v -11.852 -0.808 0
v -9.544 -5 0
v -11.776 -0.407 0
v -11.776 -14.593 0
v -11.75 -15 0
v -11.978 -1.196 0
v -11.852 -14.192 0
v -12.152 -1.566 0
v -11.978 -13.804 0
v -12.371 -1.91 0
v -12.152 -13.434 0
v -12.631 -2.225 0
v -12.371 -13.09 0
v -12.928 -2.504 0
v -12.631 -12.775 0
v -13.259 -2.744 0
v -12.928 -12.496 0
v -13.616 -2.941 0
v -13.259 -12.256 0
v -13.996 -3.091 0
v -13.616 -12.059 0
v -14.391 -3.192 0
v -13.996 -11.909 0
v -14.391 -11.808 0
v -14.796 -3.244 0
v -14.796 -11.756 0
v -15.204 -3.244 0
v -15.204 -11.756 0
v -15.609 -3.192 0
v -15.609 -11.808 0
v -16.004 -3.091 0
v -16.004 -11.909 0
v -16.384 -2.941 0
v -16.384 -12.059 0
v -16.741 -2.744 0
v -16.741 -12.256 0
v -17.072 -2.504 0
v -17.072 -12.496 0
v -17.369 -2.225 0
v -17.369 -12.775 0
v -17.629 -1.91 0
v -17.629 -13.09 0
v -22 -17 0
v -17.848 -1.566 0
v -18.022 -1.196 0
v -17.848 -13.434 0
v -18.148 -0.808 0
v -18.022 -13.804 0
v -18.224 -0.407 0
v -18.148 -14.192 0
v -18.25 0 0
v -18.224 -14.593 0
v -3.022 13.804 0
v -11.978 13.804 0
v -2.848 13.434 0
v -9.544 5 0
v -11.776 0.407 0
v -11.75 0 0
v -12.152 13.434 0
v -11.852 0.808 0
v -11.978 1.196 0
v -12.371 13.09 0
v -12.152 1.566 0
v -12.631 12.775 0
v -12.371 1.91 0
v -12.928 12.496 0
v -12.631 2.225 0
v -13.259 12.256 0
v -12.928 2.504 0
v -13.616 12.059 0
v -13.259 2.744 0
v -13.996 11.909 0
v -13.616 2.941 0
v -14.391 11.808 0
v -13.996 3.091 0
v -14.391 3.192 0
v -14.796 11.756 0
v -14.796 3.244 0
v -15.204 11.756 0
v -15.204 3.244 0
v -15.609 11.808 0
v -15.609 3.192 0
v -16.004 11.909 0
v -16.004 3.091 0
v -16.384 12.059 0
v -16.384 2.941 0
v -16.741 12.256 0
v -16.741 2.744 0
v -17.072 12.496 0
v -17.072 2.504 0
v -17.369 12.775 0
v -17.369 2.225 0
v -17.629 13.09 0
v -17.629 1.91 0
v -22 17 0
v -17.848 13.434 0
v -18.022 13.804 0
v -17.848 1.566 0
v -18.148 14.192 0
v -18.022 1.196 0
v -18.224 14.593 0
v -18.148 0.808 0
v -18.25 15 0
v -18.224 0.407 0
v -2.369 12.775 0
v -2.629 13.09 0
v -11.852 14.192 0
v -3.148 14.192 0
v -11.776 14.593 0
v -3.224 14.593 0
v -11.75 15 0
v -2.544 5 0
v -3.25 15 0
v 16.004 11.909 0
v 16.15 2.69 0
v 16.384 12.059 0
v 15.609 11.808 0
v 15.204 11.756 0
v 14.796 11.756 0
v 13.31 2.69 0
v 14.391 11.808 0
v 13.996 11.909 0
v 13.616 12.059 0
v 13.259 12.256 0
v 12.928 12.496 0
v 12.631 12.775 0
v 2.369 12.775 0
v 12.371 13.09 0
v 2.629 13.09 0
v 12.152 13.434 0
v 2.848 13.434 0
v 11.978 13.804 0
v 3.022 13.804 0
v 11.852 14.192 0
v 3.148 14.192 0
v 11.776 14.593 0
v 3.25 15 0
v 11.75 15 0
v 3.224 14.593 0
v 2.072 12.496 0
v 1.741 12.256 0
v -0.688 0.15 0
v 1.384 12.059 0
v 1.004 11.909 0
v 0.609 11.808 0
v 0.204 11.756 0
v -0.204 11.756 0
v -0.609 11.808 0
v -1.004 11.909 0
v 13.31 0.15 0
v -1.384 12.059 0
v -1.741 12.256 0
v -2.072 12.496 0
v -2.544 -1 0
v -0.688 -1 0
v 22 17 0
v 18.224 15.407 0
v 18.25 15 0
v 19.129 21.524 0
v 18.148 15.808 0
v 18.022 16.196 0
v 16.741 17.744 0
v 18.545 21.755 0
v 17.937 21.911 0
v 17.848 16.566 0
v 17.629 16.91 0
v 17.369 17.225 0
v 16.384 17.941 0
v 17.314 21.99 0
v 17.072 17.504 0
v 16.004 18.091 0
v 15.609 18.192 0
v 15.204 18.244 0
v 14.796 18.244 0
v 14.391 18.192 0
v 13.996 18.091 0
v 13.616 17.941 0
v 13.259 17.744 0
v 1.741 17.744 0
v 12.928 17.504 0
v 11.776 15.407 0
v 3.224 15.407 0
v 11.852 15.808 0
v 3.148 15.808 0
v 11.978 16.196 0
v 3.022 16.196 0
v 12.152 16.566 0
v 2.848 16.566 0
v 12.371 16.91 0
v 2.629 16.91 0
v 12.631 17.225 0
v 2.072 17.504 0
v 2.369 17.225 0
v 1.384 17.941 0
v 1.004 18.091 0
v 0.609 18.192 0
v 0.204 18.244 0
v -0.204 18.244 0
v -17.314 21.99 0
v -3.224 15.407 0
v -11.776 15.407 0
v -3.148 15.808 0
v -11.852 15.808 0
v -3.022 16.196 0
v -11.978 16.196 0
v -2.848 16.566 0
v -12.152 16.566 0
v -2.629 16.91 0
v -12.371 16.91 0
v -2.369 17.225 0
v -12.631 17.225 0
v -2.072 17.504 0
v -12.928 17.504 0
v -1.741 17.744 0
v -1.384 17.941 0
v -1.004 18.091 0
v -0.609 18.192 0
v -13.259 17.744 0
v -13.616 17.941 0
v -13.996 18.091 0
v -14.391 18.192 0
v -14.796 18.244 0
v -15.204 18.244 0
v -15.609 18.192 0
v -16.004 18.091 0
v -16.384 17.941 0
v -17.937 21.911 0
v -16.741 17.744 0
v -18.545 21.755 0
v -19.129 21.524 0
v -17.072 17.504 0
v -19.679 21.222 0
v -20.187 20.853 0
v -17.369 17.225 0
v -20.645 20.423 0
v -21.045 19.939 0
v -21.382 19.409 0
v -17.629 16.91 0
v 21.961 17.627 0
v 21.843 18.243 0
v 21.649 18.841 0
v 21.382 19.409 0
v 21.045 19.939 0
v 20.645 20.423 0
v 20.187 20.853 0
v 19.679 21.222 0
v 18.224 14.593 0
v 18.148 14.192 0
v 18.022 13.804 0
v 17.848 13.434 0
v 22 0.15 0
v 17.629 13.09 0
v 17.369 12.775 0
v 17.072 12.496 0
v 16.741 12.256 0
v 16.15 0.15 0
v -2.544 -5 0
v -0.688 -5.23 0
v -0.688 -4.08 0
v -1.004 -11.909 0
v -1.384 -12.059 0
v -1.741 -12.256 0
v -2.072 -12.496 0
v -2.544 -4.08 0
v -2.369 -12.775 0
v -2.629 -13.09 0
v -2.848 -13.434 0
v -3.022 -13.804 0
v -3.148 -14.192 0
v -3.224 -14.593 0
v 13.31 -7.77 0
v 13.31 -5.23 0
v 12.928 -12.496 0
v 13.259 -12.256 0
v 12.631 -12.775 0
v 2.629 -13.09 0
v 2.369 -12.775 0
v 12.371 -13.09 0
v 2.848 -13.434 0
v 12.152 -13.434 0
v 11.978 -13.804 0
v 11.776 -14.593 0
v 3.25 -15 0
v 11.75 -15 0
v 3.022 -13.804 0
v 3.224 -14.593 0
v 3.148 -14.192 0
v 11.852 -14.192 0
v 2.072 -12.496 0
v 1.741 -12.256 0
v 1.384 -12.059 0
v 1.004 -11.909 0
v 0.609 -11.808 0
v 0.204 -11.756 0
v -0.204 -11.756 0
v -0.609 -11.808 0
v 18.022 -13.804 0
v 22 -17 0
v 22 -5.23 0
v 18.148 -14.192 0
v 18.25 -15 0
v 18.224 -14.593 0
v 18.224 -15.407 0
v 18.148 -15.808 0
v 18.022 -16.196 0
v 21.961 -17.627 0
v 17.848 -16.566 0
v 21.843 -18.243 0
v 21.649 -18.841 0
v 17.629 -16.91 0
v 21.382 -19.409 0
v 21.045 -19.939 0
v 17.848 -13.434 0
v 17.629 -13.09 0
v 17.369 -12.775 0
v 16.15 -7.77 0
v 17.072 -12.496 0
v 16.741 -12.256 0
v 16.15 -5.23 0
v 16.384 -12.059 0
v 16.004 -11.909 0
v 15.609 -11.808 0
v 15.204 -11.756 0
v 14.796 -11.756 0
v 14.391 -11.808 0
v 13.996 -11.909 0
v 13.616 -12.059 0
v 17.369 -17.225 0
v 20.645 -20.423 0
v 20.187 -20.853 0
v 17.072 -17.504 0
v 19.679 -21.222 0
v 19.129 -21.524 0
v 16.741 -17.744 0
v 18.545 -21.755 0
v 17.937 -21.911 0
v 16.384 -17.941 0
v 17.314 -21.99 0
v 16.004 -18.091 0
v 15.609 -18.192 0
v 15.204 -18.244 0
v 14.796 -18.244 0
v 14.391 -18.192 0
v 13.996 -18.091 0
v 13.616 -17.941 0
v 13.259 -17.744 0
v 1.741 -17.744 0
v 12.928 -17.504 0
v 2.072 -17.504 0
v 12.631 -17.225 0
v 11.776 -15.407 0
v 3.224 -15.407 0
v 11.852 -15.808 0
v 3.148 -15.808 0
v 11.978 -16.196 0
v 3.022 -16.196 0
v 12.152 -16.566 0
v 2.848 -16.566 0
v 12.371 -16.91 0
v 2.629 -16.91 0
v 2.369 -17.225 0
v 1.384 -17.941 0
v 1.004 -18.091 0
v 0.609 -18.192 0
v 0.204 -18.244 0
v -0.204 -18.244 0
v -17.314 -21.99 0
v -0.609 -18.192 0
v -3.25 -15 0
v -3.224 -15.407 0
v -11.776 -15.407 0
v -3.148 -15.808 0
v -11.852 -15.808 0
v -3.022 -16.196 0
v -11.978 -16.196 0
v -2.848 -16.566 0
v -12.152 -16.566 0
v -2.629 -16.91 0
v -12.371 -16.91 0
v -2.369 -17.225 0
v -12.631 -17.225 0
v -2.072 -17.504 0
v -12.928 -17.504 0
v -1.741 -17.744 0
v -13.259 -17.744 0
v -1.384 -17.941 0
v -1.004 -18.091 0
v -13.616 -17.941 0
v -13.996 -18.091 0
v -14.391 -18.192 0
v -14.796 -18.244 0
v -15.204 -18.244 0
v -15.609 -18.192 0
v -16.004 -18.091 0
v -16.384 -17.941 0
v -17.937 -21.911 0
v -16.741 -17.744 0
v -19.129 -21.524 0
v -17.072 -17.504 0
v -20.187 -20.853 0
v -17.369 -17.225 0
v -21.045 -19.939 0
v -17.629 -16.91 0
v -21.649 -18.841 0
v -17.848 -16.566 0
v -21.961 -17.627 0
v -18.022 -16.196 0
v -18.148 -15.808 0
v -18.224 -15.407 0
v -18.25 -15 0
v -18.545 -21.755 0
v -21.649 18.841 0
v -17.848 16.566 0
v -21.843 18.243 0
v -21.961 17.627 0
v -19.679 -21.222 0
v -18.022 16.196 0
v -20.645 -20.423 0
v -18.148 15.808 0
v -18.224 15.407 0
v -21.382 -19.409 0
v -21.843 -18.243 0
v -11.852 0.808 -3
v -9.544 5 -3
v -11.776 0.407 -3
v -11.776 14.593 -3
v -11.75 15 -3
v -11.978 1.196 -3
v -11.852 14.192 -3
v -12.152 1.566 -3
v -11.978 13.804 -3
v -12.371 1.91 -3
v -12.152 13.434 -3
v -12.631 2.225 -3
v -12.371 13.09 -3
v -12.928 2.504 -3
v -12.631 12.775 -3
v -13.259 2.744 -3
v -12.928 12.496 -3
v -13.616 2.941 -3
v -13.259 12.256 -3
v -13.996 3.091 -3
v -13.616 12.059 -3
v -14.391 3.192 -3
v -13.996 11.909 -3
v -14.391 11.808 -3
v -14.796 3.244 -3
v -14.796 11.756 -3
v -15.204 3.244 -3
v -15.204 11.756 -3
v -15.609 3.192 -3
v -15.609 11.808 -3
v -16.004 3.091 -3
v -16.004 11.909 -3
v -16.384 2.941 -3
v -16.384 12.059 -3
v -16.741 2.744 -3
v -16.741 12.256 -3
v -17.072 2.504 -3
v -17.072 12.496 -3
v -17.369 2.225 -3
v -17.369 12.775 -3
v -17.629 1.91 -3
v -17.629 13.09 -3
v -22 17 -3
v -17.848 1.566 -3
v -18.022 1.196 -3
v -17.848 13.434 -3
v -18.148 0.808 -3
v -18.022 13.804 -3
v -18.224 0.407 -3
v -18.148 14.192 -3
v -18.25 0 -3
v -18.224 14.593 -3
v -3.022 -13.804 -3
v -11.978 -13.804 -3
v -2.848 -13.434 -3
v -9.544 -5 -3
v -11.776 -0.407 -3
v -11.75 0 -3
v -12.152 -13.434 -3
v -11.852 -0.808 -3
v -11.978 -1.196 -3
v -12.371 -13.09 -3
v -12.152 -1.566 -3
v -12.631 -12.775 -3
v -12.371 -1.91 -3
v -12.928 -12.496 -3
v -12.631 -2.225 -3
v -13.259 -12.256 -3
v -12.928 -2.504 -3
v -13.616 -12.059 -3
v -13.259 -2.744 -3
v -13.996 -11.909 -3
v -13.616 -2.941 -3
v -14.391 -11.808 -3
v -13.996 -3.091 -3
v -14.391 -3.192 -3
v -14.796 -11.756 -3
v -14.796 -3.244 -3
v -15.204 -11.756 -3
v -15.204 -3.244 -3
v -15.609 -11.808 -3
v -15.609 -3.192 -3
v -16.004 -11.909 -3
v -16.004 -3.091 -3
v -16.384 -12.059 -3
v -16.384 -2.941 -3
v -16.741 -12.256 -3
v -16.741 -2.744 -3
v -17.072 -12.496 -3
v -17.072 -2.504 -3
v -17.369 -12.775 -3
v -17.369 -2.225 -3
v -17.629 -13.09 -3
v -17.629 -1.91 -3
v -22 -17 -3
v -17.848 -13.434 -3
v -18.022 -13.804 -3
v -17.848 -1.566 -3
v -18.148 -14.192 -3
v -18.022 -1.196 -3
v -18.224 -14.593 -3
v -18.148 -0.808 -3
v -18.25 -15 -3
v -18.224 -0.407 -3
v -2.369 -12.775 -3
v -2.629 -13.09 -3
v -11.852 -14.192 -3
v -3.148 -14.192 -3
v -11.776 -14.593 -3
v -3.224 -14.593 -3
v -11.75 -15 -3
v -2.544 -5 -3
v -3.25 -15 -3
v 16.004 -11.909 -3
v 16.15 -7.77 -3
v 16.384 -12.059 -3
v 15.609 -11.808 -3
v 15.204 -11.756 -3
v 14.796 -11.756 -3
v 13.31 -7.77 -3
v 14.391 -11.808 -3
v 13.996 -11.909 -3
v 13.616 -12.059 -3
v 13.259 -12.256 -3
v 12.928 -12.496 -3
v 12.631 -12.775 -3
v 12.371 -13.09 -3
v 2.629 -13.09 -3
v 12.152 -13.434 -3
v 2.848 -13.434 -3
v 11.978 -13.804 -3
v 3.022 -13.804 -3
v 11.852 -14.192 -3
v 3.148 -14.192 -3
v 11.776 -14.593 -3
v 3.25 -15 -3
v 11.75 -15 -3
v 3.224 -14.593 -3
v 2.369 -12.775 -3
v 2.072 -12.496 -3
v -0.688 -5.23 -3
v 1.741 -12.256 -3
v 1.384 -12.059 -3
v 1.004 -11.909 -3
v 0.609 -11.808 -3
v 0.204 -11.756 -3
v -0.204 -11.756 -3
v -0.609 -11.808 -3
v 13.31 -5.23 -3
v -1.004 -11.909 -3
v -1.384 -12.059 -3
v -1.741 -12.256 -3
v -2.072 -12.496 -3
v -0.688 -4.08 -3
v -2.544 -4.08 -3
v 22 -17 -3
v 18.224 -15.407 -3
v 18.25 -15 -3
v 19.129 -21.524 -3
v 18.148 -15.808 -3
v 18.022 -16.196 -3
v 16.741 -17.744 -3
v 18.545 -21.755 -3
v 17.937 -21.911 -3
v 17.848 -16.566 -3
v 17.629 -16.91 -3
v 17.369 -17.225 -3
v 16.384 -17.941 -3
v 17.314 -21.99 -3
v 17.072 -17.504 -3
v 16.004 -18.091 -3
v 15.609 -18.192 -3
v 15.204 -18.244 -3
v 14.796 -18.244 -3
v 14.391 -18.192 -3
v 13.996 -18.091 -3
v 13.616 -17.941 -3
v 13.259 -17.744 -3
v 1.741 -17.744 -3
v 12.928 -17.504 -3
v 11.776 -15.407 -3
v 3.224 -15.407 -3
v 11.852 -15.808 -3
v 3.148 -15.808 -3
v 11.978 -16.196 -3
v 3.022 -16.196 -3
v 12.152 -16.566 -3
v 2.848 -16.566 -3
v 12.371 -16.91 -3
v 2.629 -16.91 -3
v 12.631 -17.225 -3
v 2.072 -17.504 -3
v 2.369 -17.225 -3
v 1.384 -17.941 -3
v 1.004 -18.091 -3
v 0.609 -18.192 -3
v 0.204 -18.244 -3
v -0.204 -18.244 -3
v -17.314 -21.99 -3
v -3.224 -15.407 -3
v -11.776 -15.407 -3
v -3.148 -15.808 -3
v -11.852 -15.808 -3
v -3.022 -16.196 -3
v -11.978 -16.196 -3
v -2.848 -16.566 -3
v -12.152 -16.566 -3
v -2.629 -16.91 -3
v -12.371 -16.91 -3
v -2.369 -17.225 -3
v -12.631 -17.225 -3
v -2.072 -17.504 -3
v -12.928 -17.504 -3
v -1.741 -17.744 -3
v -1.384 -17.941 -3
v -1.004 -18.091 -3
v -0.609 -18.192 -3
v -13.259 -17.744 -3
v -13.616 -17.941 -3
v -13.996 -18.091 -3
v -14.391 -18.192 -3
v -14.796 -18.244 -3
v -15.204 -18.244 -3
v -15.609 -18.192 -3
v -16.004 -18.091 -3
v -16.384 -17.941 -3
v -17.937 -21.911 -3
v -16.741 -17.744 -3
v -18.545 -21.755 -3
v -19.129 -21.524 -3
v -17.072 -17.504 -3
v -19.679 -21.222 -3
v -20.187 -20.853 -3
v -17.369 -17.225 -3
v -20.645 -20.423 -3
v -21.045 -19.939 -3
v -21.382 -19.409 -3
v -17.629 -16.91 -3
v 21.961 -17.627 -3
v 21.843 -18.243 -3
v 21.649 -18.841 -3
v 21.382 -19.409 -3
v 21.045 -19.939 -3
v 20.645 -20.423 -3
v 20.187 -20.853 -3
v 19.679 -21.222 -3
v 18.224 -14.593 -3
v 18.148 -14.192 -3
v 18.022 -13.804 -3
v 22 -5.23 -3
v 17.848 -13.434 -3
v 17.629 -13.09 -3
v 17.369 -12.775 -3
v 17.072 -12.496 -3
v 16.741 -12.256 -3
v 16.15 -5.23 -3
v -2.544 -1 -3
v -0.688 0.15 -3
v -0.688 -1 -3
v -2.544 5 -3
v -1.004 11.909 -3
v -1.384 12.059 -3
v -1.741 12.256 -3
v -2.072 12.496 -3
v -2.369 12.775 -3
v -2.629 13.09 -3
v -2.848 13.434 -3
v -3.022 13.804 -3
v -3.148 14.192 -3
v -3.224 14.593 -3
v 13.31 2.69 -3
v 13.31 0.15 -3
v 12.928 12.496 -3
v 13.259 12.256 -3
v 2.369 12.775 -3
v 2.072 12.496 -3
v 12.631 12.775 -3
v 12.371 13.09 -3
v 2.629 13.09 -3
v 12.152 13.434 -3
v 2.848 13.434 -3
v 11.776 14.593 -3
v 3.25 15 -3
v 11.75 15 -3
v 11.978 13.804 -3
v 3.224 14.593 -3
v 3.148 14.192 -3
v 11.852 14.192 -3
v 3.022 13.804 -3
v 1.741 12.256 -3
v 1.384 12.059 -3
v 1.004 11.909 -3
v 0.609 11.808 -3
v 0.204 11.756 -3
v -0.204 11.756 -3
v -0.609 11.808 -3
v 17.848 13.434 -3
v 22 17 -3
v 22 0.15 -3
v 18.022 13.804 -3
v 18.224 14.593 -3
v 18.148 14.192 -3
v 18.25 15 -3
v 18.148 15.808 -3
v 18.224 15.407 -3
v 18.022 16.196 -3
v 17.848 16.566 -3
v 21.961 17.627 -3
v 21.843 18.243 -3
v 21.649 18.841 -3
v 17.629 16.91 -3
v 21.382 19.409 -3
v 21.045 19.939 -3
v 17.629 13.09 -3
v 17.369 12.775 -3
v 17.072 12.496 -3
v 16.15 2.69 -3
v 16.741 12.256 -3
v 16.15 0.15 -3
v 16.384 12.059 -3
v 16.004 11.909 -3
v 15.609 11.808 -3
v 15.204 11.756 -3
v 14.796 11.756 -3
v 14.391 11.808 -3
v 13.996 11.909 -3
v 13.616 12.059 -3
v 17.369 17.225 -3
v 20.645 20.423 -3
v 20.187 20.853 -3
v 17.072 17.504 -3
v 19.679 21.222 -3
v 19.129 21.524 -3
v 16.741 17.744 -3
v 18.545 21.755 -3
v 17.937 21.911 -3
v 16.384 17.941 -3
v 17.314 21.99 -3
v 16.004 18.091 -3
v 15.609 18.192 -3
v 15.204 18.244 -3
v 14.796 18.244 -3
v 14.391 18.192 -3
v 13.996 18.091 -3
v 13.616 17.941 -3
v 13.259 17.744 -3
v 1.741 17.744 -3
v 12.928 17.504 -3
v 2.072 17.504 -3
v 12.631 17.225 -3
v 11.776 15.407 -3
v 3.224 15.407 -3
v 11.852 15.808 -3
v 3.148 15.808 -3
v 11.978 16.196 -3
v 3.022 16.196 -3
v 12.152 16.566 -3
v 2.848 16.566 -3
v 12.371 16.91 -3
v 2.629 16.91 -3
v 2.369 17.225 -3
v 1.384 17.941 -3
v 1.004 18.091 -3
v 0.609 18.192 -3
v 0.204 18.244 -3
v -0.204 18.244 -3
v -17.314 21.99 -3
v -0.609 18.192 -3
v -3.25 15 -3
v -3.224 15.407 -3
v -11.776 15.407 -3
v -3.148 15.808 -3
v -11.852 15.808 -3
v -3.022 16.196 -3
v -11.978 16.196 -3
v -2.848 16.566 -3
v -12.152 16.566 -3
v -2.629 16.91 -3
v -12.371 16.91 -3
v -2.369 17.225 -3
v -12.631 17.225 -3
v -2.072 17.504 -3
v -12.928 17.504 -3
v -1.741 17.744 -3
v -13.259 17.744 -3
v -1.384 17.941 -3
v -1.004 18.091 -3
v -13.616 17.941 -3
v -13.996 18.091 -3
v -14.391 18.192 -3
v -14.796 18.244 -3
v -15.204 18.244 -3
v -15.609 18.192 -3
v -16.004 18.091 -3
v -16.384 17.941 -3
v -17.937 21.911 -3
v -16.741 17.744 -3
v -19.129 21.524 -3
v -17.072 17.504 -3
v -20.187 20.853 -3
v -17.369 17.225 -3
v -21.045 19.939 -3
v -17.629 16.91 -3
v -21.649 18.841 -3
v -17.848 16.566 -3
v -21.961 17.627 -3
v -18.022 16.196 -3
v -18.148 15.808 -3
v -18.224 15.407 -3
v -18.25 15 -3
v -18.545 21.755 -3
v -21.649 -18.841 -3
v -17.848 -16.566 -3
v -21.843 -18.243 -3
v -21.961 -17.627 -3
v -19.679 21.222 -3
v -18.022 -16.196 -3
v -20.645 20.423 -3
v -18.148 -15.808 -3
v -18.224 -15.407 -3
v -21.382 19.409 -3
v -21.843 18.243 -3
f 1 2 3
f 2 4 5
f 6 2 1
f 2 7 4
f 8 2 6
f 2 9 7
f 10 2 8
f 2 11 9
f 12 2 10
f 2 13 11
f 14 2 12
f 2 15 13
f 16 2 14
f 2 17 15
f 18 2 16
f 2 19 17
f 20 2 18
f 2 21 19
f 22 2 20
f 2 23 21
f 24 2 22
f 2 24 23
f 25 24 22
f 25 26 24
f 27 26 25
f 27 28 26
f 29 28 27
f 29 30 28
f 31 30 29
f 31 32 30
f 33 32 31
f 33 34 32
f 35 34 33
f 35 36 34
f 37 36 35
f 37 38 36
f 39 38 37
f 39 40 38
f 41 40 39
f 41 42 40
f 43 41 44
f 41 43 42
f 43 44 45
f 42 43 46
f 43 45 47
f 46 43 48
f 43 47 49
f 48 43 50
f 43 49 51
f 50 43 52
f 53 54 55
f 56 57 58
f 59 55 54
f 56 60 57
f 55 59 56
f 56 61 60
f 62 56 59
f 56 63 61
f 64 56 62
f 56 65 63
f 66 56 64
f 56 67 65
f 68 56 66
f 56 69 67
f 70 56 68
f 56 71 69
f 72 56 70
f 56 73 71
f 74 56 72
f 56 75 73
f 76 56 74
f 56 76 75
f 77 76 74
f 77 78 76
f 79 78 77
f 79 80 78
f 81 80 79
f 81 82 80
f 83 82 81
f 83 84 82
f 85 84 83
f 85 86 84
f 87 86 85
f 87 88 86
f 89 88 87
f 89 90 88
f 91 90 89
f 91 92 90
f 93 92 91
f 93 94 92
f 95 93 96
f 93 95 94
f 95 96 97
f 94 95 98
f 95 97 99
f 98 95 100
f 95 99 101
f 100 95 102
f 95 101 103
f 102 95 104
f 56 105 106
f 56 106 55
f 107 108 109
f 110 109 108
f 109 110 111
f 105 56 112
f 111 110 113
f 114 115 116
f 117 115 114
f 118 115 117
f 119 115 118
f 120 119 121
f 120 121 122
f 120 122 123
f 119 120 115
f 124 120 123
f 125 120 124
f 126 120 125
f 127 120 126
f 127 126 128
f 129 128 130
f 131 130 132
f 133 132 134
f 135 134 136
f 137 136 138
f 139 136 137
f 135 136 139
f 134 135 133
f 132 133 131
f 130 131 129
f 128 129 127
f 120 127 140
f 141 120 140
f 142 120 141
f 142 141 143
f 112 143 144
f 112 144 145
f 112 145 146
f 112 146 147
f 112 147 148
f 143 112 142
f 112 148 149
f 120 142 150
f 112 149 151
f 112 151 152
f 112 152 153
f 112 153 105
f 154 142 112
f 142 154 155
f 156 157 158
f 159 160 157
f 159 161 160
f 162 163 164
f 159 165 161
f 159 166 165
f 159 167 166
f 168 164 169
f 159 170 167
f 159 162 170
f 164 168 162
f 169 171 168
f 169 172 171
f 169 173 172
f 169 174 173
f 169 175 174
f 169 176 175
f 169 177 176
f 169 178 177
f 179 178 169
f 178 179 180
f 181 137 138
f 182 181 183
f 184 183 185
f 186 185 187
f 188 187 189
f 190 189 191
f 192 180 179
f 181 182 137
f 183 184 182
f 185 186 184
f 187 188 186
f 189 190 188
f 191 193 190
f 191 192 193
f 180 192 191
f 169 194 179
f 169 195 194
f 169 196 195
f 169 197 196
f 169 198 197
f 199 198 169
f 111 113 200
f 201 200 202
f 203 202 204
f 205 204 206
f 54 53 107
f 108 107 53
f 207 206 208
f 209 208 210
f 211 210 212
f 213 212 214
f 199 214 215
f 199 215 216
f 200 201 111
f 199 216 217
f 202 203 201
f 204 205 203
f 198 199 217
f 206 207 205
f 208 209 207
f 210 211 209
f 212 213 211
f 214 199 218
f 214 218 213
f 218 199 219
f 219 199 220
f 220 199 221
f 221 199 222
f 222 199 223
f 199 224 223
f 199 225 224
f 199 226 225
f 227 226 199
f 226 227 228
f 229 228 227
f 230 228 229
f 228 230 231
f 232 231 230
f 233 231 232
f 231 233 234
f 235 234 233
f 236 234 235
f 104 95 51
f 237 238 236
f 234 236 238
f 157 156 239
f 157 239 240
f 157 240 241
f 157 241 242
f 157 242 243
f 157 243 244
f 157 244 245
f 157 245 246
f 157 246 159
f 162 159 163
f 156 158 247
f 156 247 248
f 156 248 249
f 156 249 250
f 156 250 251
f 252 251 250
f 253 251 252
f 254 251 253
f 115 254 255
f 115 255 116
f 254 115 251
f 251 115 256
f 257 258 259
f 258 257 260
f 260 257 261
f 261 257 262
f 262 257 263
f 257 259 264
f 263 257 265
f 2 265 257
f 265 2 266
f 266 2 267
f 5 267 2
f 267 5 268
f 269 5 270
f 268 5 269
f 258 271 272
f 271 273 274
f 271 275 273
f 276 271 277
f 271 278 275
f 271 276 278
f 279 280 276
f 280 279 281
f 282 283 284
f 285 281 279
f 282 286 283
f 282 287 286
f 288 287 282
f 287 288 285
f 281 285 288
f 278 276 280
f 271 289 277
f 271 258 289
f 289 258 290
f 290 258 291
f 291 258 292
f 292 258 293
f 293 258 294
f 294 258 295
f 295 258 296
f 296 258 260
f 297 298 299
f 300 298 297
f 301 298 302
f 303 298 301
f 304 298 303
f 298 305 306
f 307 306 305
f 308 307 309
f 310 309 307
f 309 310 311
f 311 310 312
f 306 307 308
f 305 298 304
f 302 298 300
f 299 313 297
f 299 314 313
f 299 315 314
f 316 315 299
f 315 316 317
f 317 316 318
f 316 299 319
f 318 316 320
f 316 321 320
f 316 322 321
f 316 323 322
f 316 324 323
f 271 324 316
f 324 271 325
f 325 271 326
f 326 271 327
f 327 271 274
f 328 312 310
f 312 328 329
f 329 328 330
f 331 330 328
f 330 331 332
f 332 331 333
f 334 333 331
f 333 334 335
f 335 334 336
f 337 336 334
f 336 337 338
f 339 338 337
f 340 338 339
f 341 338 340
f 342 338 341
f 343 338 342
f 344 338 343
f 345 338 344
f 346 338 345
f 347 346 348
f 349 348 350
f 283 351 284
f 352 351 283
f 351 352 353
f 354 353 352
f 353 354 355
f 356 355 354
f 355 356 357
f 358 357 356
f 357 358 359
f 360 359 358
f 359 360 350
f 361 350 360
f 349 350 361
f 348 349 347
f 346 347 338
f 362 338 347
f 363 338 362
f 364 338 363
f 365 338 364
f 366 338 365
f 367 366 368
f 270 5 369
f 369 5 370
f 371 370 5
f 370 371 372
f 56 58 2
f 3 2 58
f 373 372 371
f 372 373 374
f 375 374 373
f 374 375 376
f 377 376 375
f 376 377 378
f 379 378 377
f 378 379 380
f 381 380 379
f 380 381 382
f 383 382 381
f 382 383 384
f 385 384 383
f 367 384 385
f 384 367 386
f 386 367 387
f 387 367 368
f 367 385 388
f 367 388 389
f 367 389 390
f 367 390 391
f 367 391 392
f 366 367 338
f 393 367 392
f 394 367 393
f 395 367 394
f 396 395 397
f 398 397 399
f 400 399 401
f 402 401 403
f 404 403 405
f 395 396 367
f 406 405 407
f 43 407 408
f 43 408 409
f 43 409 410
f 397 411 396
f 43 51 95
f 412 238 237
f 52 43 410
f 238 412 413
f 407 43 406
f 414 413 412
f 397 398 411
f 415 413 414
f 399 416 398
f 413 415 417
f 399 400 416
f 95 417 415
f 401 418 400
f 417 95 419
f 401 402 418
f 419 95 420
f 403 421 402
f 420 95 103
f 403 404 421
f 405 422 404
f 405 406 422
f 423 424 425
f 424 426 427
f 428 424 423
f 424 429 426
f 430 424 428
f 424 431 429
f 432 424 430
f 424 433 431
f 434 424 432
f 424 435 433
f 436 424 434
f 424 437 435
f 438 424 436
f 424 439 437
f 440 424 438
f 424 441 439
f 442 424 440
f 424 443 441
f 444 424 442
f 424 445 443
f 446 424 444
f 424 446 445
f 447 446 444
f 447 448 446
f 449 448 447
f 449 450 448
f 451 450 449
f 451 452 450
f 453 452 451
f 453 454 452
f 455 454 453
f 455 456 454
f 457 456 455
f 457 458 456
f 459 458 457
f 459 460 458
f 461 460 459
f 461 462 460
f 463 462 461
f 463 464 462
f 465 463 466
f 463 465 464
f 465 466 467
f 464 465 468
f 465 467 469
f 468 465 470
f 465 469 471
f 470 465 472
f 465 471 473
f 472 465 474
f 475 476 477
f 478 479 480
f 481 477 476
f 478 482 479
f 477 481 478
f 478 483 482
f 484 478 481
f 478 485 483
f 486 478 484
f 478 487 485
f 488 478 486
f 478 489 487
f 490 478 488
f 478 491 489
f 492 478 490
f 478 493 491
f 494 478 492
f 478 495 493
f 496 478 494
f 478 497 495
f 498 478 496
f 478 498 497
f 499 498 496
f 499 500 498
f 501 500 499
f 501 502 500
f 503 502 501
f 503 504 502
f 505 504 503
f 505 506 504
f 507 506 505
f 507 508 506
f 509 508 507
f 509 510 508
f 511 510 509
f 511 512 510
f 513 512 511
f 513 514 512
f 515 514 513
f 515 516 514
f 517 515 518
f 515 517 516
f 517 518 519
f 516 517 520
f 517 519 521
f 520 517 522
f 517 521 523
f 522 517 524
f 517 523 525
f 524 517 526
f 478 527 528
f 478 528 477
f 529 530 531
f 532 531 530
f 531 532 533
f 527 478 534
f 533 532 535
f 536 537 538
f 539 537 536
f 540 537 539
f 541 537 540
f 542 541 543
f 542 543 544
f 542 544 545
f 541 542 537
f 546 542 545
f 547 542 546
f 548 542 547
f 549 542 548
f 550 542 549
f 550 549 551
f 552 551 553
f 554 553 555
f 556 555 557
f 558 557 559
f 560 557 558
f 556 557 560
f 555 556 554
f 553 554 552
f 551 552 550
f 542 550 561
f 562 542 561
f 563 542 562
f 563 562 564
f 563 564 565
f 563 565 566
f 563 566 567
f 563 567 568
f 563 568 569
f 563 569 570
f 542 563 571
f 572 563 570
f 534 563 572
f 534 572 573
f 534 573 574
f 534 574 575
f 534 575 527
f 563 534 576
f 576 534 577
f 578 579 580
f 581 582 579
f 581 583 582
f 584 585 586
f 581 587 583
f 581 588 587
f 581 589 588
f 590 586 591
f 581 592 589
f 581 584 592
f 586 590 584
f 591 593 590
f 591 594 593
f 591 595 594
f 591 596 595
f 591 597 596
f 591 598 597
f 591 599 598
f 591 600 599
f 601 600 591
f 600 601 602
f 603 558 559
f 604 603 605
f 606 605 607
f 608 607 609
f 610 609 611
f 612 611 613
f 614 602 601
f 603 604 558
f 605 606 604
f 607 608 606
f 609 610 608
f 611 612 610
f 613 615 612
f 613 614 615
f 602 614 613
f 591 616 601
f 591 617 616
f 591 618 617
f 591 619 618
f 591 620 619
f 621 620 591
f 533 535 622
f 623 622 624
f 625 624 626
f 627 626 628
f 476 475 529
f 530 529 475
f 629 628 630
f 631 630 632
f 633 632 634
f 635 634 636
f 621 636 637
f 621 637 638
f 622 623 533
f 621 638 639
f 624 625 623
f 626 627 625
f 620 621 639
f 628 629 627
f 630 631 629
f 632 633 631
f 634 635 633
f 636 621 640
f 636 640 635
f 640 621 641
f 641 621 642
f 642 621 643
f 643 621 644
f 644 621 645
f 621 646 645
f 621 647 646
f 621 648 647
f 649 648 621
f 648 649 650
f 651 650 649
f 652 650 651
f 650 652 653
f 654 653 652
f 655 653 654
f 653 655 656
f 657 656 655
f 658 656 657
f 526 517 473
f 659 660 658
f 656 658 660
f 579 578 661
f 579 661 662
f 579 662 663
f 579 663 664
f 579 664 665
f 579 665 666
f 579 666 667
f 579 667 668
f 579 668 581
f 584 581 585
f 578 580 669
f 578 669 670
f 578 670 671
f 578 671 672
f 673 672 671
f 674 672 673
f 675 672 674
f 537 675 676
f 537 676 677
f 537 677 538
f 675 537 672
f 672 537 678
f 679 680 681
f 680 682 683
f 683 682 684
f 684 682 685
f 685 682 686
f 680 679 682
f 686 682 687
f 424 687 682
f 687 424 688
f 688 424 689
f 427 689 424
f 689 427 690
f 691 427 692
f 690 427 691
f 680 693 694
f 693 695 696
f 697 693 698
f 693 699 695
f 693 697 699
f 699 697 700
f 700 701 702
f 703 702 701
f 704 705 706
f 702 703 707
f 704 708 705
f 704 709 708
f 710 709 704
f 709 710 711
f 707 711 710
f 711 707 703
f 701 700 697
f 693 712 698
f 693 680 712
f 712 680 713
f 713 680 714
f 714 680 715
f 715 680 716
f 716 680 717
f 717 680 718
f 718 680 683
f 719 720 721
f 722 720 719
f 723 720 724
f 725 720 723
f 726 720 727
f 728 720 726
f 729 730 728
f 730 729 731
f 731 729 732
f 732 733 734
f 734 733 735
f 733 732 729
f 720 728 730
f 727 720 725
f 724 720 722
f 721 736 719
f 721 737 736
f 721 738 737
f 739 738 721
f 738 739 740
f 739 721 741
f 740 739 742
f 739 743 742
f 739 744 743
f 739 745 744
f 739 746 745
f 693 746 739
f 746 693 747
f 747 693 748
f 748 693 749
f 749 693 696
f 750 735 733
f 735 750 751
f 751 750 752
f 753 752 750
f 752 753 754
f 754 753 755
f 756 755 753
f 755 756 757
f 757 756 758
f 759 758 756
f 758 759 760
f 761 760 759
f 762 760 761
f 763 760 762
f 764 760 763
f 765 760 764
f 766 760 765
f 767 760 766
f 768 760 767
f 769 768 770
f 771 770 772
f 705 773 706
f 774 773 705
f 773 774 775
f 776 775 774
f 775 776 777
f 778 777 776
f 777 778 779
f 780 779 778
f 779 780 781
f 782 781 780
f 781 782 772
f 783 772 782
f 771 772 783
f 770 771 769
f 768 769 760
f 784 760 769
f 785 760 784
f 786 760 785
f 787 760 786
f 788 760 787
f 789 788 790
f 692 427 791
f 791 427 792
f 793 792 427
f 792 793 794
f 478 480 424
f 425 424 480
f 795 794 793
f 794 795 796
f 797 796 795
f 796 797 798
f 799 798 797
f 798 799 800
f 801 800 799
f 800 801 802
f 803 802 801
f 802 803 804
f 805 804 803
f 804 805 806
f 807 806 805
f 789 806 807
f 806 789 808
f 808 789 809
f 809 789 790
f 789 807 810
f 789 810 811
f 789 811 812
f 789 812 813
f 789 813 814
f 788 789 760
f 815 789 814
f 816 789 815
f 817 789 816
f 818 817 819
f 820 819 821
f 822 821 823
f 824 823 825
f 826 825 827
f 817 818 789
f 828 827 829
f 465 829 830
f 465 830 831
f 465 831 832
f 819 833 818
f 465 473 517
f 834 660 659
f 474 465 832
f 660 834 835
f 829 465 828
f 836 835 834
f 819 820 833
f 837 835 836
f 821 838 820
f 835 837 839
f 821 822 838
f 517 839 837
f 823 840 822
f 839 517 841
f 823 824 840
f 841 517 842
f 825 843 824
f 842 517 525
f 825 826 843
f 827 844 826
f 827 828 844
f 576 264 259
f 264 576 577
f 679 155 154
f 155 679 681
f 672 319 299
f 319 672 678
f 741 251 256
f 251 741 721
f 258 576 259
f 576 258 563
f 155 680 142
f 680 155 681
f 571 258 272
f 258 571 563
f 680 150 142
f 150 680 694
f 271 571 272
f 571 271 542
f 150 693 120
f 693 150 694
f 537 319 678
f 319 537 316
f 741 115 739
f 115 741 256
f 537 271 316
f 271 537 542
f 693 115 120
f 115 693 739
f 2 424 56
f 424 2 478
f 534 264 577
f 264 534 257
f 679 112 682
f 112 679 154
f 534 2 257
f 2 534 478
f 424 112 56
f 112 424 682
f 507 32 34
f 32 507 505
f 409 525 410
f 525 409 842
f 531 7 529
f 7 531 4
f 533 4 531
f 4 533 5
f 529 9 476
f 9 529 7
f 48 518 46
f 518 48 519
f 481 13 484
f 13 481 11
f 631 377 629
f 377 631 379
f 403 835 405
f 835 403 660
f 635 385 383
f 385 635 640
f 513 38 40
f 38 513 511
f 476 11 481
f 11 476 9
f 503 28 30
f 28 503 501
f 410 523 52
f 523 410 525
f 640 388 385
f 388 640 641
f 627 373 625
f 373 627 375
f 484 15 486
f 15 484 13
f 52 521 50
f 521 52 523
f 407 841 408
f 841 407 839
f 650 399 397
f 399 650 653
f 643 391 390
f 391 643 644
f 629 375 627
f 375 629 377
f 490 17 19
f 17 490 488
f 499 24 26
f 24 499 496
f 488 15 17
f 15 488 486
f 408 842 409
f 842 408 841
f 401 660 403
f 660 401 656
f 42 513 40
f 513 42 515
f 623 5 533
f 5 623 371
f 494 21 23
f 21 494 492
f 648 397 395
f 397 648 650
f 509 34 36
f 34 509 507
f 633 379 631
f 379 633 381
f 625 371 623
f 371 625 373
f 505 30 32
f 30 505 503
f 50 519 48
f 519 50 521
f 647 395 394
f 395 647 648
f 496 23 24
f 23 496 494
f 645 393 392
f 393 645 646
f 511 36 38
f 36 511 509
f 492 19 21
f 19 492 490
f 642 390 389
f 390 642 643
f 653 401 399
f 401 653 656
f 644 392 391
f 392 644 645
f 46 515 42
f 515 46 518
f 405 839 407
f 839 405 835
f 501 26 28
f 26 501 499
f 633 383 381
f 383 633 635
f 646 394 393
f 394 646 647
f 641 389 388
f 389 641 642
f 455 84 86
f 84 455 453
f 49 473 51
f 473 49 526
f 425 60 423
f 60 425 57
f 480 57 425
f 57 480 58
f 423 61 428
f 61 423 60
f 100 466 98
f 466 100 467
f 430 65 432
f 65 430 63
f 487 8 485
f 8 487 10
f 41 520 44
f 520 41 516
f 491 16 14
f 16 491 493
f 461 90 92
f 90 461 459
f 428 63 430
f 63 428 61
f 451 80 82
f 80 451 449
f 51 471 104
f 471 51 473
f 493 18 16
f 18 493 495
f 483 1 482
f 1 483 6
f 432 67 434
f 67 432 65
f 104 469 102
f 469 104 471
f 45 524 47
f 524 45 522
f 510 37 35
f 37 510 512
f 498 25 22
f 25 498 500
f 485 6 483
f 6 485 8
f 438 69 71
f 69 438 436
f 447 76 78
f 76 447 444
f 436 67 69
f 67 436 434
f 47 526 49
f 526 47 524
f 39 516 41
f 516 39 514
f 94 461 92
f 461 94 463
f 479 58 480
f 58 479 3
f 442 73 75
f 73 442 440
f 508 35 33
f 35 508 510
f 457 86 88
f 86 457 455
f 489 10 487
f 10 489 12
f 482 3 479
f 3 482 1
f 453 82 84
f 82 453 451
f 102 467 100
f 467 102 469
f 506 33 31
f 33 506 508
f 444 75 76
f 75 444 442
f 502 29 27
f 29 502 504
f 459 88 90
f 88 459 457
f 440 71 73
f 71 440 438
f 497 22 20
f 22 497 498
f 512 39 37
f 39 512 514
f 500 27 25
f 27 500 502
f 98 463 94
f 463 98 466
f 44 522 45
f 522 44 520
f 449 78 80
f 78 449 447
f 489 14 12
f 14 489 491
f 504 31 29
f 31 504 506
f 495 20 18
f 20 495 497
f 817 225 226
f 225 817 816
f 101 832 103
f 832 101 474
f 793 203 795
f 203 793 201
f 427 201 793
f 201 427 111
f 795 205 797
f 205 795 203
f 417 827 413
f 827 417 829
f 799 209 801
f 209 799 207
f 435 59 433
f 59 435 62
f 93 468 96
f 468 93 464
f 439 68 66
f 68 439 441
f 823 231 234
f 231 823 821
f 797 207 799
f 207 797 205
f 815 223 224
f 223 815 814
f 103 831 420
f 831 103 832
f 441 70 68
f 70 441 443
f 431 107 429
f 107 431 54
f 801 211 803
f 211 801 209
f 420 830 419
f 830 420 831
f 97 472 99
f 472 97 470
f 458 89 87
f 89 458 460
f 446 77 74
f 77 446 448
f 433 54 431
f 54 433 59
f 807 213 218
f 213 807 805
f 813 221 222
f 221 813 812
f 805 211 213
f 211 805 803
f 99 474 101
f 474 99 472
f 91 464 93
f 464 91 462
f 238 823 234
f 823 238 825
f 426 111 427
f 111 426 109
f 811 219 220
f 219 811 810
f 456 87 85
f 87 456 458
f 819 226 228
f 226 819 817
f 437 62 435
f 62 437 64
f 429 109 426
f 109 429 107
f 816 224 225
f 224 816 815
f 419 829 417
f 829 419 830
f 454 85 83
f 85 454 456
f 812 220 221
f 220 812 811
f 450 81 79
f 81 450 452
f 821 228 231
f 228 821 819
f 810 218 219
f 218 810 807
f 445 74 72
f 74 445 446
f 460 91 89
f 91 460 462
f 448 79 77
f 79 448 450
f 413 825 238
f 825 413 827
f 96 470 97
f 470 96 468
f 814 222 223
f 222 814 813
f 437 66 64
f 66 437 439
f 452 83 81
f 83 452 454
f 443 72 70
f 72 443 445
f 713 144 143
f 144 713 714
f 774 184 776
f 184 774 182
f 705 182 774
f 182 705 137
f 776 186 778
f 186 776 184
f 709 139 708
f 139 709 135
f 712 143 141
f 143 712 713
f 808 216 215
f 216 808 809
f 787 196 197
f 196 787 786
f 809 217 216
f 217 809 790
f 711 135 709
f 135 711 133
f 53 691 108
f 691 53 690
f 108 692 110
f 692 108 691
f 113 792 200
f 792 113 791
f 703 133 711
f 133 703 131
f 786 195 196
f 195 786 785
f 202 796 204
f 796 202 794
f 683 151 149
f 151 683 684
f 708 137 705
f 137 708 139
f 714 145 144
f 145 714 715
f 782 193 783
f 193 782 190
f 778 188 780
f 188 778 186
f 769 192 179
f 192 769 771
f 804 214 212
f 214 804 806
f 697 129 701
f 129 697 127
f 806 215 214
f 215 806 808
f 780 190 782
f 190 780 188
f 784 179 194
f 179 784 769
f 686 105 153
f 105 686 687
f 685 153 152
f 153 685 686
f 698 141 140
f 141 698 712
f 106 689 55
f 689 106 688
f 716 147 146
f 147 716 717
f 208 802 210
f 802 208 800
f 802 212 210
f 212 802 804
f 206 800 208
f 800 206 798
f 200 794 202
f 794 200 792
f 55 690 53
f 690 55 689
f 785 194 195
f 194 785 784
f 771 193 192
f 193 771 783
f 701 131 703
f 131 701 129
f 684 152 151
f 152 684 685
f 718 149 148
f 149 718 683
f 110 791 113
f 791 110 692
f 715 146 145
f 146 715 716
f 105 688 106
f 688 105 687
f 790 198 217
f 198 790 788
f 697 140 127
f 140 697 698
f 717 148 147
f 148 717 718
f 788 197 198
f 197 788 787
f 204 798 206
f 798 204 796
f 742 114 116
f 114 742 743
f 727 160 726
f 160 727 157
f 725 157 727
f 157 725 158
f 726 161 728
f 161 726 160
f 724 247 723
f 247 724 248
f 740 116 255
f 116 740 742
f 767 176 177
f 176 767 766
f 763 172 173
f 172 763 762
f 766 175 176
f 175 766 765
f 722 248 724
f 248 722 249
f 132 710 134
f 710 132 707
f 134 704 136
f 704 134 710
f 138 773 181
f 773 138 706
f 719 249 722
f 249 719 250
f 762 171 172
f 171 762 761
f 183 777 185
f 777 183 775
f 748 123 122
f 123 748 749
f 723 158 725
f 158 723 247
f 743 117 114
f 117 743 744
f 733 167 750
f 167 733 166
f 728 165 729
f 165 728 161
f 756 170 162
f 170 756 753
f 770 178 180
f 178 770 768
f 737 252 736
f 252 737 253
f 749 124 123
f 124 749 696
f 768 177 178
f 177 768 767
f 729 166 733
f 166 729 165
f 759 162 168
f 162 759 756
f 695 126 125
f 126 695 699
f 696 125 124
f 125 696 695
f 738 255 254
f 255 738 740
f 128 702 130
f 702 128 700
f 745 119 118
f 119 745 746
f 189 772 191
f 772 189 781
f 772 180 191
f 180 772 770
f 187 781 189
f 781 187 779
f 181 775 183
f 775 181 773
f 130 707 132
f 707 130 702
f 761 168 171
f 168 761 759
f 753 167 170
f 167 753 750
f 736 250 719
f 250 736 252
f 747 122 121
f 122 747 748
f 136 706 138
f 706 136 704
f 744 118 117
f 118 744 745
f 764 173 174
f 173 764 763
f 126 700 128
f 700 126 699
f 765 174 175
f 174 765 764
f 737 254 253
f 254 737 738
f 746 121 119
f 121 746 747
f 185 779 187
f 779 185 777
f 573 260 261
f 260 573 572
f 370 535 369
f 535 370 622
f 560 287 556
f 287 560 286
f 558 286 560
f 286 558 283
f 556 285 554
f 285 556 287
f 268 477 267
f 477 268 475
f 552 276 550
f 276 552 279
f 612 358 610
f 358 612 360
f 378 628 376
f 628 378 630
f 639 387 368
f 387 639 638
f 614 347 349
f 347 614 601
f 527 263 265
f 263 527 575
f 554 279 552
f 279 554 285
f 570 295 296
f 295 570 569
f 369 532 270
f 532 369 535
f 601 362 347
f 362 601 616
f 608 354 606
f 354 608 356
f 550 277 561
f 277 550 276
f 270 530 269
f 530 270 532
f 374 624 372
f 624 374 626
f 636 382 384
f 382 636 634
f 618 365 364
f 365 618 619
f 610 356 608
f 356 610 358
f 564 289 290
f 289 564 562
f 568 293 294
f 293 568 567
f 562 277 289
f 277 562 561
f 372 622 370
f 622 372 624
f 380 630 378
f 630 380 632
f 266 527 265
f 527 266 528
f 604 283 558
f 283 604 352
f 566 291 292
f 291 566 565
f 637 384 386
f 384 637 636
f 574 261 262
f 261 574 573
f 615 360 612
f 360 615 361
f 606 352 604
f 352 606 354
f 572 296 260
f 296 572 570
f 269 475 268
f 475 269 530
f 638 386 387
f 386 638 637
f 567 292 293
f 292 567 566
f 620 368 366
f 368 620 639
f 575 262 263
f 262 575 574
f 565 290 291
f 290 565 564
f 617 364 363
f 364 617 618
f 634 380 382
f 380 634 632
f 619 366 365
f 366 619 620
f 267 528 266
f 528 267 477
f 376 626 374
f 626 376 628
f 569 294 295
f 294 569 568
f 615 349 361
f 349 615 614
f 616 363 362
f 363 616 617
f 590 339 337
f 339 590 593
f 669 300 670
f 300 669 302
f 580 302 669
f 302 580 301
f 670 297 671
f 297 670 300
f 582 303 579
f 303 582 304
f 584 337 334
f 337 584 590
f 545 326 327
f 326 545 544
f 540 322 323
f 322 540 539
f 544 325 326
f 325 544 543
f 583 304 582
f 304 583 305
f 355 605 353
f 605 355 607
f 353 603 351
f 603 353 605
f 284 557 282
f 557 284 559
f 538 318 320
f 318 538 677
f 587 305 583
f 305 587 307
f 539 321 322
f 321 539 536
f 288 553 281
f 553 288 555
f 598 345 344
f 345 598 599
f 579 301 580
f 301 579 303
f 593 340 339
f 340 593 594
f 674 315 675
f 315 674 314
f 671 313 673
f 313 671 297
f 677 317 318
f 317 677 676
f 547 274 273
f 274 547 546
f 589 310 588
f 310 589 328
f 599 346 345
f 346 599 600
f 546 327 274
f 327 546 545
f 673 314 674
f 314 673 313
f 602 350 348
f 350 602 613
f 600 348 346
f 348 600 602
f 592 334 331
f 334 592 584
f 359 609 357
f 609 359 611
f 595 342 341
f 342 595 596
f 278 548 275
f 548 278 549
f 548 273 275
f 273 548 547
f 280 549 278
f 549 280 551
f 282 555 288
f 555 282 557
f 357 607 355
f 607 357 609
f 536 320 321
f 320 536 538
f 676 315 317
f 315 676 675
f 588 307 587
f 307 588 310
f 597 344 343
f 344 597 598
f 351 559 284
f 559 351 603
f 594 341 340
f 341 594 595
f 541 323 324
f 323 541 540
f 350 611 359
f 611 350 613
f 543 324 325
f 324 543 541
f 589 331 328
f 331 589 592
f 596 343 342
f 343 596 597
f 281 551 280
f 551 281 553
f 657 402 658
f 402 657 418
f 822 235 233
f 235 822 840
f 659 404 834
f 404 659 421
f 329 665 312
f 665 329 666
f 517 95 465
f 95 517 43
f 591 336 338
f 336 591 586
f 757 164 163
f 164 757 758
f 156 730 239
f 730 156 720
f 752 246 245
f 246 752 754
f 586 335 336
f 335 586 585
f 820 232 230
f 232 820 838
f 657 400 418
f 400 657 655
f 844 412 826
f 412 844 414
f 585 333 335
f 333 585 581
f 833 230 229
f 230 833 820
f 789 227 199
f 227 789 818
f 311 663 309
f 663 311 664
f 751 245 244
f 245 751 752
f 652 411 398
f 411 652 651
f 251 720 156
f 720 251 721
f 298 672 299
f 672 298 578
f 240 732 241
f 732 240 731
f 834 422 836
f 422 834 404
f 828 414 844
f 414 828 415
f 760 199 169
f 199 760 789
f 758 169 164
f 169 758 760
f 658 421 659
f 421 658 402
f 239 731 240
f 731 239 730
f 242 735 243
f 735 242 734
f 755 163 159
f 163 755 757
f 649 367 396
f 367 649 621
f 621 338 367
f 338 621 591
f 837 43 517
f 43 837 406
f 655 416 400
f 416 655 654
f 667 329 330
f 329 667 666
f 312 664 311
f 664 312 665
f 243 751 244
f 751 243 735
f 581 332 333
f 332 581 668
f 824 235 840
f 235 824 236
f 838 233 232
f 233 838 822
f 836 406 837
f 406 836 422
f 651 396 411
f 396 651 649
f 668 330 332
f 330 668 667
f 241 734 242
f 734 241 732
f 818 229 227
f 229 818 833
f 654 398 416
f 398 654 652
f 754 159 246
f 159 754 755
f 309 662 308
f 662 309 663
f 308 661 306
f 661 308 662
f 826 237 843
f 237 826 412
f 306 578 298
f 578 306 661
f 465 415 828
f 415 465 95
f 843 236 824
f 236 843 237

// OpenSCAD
$fn = 50;


difference() {
	union() {
		*color(alpha = 1.0000000000, c = "gray") {
			translate(v = [0, 14, -3]) {
				linear_extrude(height = 3) {
					text(font = "Arial:style=Bold", halign = "center", size = 4.5000000000, text = "COMMENT description oobb_plate_shape_positive_type_3_depth_0_0_-3_pos_motor_extra_3_thickness_3_width_3_height_0_0_-3_pos_plate", valign = "center");
				}
			}
		}
		translate(v = [0, 0, -3]) {
			hull() {
				translate(v = [-17.0000000000, 17.0000000000, 0]) {
					cylinder(h = 3, r = 5);
				}
				translate(v = [17.0000000000, 17.0000000000, 0]) {
					cylinder(h = 3, r = 5);
				}
				translate(v = [-17.0000000000, -17.0000000000, 0]) {
					cylinder(h = 3, r = 5);
				}
				translate(v = [17.0000000000, -17.0000000000, 0]) {
					cylinder(h = 3, r = 5);
				}
			}
		}
		*color(alpha = 1.0000000000, c = "gray") {
			translate(v = [0, 14, -3]) {
				linear_extrude(height = 3) {
					text(font = "Arial:style=Bold", halign = "center", size = 4.5000000000, text = "COMMENT description oobb_holes_shape_p_type_0_0_-3_pos_motor_extra_3_thickness_3_width_3_height_0_0_-3_pos_plate_'left'_'right'_'top'_hole_sides_'left'_'right'_'top'_holes_true_both_holes", valign = "center");
				}
			}
		}
		*color(alpha = 1.0000000000, c = "gray") {
			translate(v = [0, 14, -3]) {
				rotate(a = [0, 0, 180]) {
					linear_extrude(height = 3) {
						text(font = "Arial:style=Bold", halign = "center", size = 4.5000000000, text = "COMMENT description oobb_wire_motor_shape_0_0_-3_pos_motor_extra_3_thickness_3_width_3_height_0_0_-3_pos_plate_0_0_180_rot", valign = "center");
					}
				}
			}
		}
	}
	union() {
		translate(v = [22.5000000000, 0, -3]) {
			rotate(a = [0, 0, 180]) {
				difference() {
					union() {
						translate(v = [23.0670000000, 1.0000000000, 0]) {
							cube(size = [5, 3.0800000000, 3]);
						}
						translate(v = [0.2040000000, -0.1500000000, 0]) {
							cube(size = [6.3000000000, 5.3800000000, 3]);
						}
						translate(v = [8.8880000000, -0.1500000000, 0]) {
							cube(size = [14.3000000000, 5.3800000000, 3]);
						}
						translate(v = [6.3500000000, -2.6900000000, 0]) {
							cube(size = [2.8400000000, 10.4600000000, 3]);
						}
						translate(v = [25.0440000000, -5.0000000000, 0]) {
							cube(size = [7, 10, 3]);
						}
					}
					union();
				}
			}
		}
		translate(v = [-15.0000000000, -15.0000000000, -50.0000000000]) {
			cylinder(h = 100, r = 3.2500000000);
		}
		translate(v = [-15.0000000000, 0.0000000000, -50.0000000000]) {
			cylinder(h = 100, r = 3.2500000000);
		}
		translate(v = [-15.0000000000, 15.0000000000, -50.0000000000]) {
			cylinder(h = 100, r = 3.2500000000);
		}
		translate(v = [-15.0000000000, 15.0000000000, -50.0000000000]) {
			cylinder(h = 100, r = 3.2500000000);
		}
		translate(v = [0.0000000000, 15.0000000000, -50.0000000000]) {
			cylinder(h = 100, r = 3.2500000000);
		}
		translate(v = [15.0000000000, 15.0000000000, -50.0000000000]) {
			cylinder(h = 100, r = 3.2500000000);
		}
		translate(v = [-15.0000000000, -15.0000000000, -50.0000000000]) {
			cylinder(h = 100, r = 3.2500000000);
		}
		translate(v = [0.0000000000, -15.0000000000, -50.0000000000]) {
			cylinder(h = 100, r = 3.2500000000);
		}
		translate(v = [15.0000000000, -15.0000000000, -50.0000000000]) {
			cylinder(h = 100, r = 3.2500000000);
		}
	}
}
